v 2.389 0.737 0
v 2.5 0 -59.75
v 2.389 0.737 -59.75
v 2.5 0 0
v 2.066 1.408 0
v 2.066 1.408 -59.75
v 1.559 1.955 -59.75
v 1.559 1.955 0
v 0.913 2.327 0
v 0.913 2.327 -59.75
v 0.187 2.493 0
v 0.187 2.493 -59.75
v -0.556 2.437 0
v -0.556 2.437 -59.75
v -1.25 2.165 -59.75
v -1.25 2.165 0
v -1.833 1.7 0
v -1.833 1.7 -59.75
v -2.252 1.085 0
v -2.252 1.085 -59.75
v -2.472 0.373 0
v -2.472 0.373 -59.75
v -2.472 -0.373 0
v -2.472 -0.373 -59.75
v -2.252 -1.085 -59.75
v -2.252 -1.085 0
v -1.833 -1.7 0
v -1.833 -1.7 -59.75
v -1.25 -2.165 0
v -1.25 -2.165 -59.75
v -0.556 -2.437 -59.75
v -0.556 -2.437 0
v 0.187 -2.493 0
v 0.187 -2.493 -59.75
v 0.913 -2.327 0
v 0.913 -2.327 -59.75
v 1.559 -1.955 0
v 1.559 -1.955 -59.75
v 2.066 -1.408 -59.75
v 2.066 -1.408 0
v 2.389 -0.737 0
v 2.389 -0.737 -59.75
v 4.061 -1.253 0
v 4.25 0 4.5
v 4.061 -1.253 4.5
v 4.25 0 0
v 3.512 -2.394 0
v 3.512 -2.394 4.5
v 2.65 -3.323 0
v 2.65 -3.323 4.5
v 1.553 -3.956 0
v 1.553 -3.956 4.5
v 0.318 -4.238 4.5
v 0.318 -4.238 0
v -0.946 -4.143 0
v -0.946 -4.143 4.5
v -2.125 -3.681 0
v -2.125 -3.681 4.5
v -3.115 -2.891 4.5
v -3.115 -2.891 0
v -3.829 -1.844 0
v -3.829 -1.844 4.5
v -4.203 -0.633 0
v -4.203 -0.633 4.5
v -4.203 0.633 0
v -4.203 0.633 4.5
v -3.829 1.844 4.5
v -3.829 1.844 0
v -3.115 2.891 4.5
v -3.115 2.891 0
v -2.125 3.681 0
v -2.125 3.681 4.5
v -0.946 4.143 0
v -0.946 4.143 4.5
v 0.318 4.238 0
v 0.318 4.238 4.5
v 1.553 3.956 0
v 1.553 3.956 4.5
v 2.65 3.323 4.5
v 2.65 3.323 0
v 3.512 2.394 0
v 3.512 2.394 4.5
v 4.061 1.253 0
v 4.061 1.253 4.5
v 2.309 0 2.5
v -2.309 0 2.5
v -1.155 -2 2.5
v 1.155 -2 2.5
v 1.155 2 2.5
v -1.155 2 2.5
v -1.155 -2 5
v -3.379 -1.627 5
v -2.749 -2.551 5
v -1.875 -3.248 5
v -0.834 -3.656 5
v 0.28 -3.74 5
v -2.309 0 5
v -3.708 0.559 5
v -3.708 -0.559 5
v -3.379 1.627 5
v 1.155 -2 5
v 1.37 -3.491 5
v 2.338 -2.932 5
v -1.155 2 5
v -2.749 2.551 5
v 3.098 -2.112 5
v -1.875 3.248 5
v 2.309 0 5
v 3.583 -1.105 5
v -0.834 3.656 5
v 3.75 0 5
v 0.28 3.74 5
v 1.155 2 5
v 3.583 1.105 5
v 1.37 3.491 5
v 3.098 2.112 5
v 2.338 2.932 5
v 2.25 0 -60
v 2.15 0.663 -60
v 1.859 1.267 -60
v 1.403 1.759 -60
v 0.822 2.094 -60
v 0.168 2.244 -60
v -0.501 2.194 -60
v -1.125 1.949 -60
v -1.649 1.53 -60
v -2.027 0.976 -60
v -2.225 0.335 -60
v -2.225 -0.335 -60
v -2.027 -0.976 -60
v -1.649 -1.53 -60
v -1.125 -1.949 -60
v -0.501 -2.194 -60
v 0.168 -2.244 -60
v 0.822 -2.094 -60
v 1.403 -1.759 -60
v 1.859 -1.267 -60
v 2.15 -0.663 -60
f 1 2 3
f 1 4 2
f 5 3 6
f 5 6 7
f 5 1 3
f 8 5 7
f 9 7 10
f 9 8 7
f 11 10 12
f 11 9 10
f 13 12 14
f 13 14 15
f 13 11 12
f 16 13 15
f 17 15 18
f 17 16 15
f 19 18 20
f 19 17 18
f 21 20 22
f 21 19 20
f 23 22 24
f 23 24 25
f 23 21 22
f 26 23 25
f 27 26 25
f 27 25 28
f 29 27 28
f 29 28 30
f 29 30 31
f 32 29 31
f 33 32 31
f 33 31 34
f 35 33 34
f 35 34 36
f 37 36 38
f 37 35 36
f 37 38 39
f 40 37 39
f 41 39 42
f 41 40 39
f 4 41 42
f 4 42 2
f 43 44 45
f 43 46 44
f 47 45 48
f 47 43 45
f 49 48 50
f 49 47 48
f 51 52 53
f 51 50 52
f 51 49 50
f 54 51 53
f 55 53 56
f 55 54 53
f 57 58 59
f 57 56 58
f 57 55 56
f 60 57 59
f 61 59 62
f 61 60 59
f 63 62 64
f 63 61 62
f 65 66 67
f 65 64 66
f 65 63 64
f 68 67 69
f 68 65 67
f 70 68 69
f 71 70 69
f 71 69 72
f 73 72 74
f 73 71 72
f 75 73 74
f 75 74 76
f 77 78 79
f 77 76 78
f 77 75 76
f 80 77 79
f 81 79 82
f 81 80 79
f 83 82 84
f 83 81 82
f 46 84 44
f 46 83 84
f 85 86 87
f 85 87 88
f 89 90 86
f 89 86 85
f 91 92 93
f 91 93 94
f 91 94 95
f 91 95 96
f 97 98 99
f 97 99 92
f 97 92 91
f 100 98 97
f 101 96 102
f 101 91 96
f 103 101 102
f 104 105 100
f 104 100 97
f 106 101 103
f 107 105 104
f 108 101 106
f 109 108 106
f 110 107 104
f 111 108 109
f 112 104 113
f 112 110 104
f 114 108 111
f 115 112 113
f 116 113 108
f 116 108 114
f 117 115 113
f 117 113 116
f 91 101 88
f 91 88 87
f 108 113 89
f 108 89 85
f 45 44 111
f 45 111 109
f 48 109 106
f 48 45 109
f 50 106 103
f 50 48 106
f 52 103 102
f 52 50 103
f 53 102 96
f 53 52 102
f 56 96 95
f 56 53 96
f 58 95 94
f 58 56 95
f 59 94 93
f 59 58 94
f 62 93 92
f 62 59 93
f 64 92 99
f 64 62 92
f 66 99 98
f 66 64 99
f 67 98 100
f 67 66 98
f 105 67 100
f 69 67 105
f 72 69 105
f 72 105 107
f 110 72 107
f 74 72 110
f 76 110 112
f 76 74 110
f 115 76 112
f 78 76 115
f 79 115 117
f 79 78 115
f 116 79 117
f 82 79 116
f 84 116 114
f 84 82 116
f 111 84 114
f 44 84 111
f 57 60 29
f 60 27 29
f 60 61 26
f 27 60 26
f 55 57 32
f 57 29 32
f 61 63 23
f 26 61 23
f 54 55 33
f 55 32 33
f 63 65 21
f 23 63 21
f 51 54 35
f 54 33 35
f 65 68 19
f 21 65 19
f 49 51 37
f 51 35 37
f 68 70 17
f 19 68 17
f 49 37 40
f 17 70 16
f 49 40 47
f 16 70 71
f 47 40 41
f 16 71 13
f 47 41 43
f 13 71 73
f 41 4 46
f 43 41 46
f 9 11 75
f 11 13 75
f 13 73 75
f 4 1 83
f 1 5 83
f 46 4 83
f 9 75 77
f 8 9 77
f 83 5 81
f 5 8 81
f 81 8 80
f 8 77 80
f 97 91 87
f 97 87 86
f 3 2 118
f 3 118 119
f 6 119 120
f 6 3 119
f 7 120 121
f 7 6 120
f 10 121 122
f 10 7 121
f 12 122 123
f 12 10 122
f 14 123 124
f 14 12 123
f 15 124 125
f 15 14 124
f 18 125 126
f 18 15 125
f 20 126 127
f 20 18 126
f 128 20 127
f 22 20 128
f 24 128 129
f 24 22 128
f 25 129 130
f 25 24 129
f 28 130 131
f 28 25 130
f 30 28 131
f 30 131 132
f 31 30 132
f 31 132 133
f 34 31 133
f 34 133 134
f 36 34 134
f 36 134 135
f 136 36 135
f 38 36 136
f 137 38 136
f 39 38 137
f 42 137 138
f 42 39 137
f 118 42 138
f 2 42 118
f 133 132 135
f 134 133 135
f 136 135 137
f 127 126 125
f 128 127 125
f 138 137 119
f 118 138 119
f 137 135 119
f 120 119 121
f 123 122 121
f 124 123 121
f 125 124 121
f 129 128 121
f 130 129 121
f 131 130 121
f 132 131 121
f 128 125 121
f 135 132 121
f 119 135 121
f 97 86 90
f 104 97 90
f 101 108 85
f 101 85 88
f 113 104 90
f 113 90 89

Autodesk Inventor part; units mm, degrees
ref_plane "YZ Plane" through (0, 0, 0) normal (1, 0, 0) x (0, 1, 0)
ref_plane "XZ Plane" through (0, 0, 0) normal (0, 1, 0) x (-1, 0, 0)
ref_plane "XY Plane" through (0, 0, 0) normal (0, 0, 1) x (1, 0, 0)
sketch "Sketch3" plane through (0, 0, 0) normal (0, 0, 1) x (1, 0, 0)
  circle A0 centre (0, 0) radius 2.5
  dimension "Diameter" = 5
extrude "Extrusion1" add sketch "Sketch3" against normal blind 60
sketch "Sketch4" plane through (0, 0, 0) normal (0, 0, 1) x (1, 0, 0)
  circle A0 centre (0, 0) radius 2.5 projected
  circle A1 centre (0, 0) radius 4.25
  dimension "Head_Diameter" = 8.5
extrude "Extrusion2" add sketch "Sketch4" along normal blind 5 contours A0 | A1
sketch "Sketch5" plane through (0, 0, 5) normal (0, 0, 1) x (1, 0, 0)
  circle A0 centre (0, 0) radius 4.25 projected
  line L0 (2.3094, 0) -> (1.1547, -2)
  line L1 (1.1547, -2) -> (-1.1547, -2)
  line L2 (-1.1547, -2) -> (-2.3094, 0)
  line L3 (-2.3094, 0) -> (-1.1547, 2)
  line L4 (-1.1547, 2) -> (1.1547, 2)
  line L5 (1.1547, 2) -> (2.3094, 0)
  line L6 (0, 0) -> (2.3094, 0) construction
  dimension "Hex_Width" = 4
extrude "Extrusion3" cut sketch "Sketch5" against normal blind 2.5 contours L0 L1 L2 L3 L4 L5
thread "Thread1" size "M5x0.8" class "4g6g" standard "ANSI Metric M Profile" length 22
chamfer "Chamfer1" distance 0.5 angle 45 1 edges at (-4.25, 0, 5)
chamfer "Chamfer2" distance 0.25 angle 45 1 edges at (-2.5, 0, -60)
equation "\"d14\" = 0.5 * Chamfer"
equation "\"Chamfer\" = 0.5"
properties part number "SCREW,SOCKET HD,P,12.9,M5X0.8X60MM" material "Steel, MS"
